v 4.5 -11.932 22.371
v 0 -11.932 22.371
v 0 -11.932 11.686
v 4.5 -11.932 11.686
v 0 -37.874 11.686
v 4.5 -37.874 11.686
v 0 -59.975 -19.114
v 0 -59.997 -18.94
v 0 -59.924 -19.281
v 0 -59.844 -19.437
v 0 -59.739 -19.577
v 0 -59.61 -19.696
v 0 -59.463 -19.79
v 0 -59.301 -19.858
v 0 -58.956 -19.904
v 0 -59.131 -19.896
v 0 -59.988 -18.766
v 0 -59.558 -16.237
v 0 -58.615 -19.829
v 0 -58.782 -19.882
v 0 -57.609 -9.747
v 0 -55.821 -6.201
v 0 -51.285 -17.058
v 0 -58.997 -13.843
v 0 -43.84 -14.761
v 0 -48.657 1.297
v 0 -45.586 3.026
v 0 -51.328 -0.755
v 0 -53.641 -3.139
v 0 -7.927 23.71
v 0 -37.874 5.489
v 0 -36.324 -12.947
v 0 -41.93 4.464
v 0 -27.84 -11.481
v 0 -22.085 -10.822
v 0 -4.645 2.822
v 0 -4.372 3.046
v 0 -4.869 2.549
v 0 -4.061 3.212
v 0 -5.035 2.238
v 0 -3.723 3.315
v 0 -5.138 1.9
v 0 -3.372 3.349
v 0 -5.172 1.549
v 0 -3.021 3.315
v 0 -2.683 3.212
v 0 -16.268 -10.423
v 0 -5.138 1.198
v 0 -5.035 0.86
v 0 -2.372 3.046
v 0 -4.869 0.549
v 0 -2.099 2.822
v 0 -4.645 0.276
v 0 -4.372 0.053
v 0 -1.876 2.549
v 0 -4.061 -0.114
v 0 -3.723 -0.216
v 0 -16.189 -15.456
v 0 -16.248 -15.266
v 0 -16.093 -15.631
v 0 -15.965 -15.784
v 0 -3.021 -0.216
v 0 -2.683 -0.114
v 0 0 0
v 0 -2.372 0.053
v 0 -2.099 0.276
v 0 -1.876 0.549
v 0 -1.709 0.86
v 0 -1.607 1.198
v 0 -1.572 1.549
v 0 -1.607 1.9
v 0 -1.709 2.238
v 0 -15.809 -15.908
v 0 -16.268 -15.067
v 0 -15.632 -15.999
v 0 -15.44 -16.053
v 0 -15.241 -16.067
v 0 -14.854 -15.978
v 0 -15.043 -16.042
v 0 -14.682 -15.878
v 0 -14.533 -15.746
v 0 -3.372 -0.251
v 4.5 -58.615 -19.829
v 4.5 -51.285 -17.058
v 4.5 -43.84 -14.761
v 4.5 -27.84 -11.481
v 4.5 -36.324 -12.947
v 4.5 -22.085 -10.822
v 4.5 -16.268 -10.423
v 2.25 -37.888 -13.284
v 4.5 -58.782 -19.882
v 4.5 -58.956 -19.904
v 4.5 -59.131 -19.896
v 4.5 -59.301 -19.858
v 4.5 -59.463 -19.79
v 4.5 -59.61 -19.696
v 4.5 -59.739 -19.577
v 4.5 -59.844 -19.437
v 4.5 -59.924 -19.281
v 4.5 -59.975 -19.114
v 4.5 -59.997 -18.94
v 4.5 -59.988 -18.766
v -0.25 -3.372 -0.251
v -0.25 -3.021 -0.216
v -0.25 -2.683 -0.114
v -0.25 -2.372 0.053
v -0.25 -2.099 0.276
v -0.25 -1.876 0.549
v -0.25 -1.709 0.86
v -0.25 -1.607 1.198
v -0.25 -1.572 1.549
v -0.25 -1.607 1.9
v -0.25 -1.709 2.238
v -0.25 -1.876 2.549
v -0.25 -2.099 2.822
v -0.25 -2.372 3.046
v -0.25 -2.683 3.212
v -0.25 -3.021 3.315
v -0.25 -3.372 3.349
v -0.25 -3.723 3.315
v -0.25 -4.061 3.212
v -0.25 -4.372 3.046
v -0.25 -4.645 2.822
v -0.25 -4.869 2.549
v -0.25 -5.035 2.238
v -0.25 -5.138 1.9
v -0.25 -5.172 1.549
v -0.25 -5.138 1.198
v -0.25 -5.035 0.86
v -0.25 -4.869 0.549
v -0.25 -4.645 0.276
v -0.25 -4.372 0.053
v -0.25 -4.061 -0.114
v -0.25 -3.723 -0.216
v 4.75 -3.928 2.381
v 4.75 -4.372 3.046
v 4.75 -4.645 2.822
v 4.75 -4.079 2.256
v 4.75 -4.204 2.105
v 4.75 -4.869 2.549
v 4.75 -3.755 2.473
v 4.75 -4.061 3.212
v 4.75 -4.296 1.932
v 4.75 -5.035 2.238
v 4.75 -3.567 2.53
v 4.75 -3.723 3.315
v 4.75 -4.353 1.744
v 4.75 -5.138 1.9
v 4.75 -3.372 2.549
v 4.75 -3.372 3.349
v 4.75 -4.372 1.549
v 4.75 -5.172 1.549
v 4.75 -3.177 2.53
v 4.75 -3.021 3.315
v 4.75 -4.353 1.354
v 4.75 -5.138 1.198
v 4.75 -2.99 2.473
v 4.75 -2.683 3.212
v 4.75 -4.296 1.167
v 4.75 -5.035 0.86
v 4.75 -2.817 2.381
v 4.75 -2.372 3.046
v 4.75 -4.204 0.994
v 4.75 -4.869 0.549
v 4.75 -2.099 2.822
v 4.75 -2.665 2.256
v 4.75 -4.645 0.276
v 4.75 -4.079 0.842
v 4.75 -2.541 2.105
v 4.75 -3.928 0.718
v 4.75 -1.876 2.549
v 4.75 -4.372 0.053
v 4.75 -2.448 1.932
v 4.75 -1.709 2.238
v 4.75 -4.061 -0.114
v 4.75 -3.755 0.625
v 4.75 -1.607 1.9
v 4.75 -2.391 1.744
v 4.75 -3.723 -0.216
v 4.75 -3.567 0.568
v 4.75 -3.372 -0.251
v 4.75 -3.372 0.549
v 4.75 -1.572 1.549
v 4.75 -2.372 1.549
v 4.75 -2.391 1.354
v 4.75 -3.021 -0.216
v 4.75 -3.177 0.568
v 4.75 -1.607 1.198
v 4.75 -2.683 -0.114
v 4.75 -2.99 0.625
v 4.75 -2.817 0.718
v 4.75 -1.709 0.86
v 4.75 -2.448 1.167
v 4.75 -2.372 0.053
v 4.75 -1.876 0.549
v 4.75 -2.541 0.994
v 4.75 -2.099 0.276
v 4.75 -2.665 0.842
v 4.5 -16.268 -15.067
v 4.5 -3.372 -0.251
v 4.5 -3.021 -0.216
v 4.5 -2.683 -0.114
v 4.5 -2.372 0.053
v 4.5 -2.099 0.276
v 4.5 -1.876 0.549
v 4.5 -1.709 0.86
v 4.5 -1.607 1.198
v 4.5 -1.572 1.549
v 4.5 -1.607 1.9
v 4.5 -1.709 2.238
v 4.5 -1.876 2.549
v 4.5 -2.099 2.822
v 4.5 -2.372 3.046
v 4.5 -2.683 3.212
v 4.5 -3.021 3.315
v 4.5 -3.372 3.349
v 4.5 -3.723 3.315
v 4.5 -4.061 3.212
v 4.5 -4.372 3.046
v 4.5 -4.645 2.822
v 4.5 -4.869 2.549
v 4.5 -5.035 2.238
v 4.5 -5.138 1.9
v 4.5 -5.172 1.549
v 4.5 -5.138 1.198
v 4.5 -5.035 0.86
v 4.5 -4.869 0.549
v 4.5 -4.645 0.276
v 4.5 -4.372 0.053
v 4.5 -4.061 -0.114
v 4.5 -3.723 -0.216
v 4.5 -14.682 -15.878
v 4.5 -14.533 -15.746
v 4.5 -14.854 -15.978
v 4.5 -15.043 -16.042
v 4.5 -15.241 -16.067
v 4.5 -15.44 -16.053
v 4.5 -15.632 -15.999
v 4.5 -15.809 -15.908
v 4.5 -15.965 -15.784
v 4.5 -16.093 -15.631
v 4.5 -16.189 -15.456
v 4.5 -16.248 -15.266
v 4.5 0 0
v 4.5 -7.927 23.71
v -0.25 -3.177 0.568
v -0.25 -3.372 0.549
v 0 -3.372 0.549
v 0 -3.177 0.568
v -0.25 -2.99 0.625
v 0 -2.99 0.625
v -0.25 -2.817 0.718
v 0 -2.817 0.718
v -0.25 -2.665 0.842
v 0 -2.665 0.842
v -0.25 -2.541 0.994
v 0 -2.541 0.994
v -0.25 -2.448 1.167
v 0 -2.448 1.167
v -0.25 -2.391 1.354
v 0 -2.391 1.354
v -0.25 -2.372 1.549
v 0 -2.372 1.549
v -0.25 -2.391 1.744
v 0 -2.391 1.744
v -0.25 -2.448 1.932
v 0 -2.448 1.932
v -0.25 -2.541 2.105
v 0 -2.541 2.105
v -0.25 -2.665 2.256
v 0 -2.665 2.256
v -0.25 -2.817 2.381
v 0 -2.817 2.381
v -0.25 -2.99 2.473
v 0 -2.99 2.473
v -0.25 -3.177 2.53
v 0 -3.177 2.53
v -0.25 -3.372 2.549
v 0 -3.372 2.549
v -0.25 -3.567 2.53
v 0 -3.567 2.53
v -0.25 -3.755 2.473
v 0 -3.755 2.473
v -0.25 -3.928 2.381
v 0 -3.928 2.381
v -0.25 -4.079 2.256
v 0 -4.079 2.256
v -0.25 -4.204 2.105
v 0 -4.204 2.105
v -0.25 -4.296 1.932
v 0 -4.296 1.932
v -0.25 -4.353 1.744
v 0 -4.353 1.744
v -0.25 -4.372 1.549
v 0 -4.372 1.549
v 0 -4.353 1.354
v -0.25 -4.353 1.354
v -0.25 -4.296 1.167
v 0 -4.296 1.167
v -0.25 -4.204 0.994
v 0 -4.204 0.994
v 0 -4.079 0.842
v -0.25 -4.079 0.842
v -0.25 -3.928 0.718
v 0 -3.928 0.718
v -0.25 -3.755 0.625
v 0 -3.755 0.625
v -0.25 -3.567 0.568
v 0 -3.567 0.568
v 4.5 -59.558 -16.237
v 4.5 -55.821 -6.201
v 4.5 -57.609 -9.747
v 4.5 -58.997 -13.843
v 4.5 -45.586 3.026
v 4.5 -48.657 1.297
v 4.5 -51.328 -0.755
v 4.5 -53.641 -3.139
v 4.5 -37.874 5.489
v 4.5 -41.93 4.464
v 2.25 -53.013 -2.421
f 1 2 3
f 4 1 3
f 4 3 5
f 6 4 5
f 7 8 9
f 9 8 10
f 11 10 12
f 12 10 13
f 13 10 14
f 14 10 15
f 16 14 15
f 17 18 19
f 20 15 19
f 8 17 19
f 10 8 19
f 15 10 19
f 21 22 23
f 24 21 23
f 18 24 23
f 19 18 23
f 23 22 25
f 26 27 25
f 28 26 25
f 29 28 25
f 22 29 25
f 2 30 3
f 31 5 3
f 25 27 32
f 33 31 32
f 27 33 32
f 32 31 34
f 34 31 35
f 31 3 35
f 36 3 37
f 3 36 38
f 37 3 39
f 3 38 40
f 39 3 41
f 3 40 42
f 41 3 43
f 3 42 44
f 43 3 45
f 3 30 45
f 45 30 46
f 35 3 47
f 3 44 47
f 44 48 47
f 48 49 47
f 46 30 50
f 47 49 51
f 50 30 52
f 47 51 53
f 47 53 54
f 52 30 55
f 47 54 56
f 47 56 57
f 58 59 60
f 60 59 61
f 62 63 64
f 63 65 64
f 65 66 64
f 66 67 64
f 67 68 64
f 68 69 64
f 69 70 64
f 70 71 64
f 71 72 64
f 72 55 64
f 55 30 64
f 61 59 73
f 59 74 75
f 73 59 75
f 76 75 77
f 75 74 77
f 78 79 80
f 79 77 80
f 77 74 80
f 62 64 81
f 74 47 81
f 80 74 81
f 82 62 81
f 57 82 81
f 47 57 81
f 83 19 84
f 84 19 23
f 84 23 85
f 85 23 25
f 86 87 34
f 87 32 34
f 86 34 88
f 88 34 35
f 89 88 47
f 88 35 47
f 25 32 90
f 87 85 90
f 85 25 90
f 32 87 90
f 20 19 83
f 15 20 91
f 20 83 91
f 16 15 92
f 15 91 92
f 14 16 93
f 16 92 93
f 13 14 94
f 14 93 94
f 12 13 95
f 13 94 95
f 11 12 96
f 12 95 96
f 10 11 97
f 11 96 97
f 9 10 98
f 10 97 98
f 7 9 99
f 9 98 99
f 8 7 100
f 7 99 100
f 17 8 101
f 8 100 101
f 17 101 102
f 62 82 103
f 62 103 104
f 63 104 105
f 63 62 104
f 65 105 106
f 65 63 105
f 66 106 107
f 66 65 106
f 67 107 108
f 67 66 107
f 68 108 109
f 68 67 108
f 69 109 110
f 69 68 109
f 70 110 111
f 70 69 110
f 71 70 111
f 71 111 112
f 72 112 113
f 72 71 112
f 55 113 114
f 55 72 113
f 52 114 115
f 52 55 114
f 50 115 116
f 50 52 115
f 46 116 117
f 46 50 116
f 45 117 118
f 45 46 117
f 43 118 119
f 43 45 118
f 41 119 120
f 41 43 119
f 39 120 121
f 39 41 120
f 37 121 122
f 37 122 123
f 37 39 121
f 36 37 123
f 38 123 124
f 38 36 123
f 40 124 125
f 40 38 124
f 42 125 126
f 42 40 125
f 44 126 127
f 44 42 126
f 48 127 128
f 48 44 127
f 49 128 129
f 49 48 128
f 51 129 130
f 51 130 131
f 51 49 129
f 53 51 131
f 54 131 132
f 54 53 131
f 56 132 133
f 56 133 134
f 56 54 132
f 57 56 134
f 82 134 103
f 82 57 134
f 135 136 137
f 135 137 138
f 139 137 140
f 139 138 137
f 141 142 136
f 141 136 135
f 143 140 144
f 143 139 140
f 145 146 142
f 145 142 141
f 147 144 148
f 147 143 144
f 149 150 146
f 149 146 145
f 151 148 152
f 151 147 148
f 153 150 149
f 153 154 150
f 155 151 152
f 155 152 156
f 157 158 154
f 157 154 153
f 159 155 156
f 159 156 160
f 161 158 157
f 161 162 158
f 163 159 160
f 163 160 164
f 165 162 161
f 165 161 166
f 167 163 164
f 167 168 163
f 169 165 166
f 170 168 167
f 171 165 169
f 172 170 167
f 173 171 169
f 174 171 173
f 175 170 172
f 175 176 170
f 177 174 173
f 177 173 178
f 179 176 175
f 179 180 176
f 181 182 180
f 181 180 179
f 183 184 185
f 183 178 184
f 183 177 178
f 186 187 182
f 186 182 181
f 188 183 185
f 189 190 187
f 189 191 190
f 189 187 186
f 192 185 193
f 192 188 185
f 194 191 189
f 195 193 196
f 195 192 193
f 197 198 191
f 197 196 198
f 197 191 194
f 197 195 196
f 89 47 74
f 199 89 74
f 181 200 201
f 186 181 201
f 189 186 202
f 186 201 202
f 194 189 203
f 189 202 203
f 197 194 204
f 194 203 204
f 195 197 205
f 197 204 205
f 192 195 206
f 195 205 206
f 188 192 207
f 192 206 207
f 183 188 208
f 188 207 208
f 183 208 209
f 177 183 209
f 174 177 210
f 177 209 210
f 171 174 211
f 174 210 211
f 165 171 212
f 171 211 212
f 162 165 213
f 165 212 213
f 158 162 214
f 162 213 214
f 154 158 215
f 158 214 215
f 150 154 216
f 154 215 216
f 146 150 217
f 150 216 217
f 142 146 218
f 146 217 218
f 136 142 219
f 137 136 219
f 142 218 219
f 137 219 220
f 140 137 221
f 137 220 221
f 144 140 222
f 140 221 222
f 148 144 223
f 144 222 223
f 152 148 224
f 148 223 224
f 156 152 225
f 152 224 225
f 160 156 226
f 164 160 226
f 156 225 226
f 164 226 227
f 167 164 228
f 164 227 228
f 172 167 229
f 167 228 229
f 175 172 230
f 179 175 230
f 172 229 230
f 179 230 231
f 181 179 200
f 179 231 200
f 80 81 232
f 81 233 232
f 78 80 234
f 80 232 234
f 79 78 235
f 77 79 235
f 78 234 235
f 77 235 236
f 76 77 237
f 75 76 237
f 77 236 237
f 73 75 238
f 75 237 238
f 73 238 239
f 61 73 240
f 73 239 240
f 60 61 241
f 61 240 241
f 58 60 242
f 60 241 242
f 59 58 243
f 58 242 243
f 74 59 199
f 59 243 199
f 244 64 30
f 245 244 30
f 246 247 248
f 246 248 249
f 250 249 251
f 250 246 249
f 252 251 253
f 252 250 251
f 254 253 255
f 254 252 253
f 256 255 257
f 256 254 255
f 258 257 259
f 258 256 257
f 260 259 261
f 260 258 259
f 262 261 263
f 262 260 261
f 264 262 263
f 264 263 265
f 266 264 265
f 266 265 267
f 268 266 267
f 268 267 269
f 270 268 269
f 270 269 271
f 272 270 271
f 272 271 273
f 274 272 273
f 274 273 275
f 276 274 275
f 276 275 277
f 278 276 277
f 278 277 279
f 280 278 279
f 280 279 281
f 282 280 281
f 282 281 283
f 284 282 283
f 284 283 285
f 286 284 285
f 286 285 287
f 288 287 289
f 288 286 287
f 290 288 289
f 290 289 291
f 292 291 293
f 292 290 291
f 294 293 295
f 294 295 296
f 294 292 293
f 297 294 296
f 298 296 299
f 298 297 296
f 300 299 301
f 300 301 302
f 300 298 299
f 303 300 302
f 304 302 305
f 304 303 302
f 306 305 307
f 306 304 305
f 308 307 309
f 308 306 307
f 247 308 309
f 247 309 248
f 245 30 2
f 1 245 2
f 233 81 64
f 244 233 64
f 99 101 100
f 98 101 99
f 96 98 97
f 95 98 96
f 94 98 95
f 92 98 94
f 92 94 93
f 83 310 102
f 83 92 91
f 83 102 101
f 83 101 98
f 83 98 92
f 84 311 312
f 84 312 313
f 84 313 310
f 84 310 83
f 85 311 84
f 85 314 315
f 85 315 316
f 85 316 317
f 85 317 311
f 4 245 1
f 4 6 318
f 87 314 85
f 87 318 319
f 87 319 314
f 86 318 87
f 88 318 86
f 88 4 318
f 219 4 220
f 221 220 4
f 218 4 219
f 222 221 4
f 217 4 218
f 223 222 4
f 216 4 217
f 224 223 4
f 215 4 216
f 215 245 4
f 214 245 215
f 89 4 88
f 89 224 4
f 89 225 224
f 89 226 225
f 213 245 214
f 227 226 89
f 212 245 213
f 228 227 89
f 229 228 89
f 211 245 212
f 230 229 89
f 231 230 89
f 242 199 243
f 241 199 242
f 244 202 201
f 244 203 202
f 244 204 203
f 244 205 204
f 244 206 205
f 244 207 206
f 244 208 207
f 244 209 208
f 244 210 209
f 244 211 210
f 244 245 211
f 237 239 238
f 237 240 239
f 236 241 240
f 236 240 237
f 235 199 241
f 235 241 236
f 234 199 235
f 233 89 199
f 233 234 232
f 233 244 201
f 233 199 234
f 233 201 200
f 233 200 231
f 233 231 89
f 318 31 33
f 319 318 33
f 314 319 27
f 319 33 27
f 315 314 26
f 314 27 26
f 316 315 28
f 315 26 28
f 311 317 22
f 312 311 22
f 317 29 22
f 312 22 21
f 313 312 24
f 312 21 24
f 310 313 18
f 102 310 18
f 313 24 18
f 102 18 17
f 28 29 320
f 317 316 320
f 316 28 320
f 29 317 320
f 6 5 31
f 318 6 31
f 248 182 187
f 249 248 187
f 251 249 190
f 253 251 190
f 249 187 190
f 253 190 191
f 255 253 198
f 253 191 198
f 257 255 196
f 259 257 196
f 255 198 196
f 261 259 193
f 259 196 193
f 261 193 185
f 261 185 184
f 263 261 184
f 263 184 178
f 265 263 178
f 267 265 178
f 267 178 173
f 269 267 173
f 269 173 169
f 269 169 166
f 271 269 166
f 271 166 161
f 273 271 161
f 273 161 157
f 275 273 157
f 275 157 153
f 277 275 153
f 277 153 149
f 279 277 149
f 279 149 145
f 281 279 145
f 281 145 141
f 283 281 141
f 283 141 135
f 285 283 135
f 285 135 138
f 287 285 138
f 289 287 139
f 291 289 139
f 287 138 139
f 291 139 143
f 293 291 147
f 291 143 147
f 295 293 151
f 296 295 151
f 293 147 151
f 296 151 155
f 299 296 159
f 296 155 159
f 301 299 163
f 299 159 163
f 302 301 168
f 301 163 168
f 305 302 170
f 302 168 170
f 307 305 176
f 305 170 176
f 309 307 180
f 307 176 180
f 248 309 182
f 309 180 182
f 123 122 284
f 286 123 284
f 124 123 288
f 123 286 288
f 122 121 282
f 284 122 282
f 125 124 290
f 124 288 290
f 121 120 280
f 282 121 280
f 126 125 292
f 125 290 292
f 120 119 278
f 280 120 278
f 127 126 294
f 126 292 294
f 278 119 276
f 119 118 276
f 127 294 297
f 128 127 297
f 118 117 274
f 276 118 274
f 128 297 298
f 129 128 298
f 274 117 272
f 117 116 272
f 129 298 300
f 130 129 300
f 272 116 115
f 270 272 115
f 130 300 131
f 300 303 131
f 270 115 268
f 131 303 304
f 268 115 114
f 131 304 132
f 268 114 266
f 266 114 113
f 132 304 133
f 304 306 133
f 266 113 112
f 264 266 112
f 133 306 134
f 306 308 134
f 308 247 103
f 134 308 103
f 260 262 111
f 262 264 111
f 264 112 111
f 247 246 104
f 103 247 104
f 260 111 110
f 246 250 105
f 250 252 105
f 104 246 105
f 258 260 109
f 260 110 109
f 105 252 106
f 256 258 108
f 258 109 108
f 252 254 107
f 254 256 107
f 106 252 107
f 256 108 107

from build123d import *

# Parameters (mm, degrees)
BOSS_EXTRUDE2_DEPTH     = 4.5
SKETCH4_R               = 1
CUT_EXTRUDE2_DEPTH      = 1.0000001
CUT_EXTRUDE2_DEPTH_BACK = 5.5000001
FILLET1_R               = 1
FILLET2_R               = 1
SKETCH5_R               = 1.8
BOSS_EXTRUDE3_DEPTH     = 0.25
SKETCH7_R               = 1
CUT_EXTRUDE3_DEPTH      = 5.7500001


with BuildPart() as part:
    # Sketch3 → Boss-Extrude2 (new body)
    with BuildSketch(Plane(origin=(0, 0, 0), x_dir=(0, 0, -1), z_dir=(1, 0, 0))):
        with BuildLine():
            Line((0, 0), (-23.709832228, -7.927411666))
            Line((-23.709832228, -7.927411666), (-22.370761505, -11.93239381))
            Line((-22.370761505, -11.93239381), (-11.685771853, -11.93239381))
            Line((-11.685771853, -11.93239381), (-11.685771853, -37.874021232))
            Line((-11.685771853, -37.874021232), (-5.488568376, -37.874021232))
            add(Edge.make_bspline(
                [(-5.488568376, -37.874021232), (-1.643222614, -57.890316076), (20.496609615, -60.199338536)],
                knots=[0, 0, 0, 1, 1, 1], degree=2))
            add(Edge.make_bspline(
                [(20.496609615, -60.199338536), (11.480964524, -39.196951523), (10.423170282, -16.267555055)],
                knots=[0, 0, 0, 1, 1, 1], degree=2))
            Line((10.423170282, -16.267555055), (17.625325674, -16.267555055))
            Line((17.625325674, -16.267555055), (0, 0))
        make_face()
    extrude(amount=BOSS_EXTRUDE2_DEPTH)

    # Sketch4 → Cut-Extrude2 (cut, two sides)
    with BuildSketch(Plane(origin=(4.5, 0, 0), x_dir=(0, 0, -1), z_dir=(1, 0, 0))) as cut_extrude2_sk:
        with Locations((-1.549252561, -3.372235527)):
            Circle(SKETCH4_R)
    extrude(amount=CUT_EXTRUDE2_DEPTH, mode=Mode.SUBTRACT)
    extrude(cut_extrude2_sk.sketch, amount=-CUT_EXTRUDE2_DEPTH_BACK, mode=Mode.SUBTRACT)

    # Fillet1
    fillet1_edges = [part.edges().sort_by_distance(p)[0] for p in [
        (2.25, -16.267555055, -17.625325674),
    ]]
    fillet(fillet1_edges, radius=FILLET1_R)

    # Fillet2
    fillet2_edges = [part.edges().sort_by_distance(p)[0] for p in [
        (2.25, -60.199338536, -20.496609615),
    ]]
    fillet(fillet2_edges, radius=FILLET2_R)

    # Sketch5 → Boss-Extrude3 (add)
    with BuildSketch(Plane(origin=(4.5, 0, 0), x_dir=(0, 0, -1), z_dir=(1, 0, 0))):
        with Locations((-1.549252561, -3.372235527)):
            Circle(SKETCH5_R)
    boss_extrude3 = extrude(amount=BOSS_EXTRUDE3_DEPTH)

    # Sketch7 → Cut-Extrude3 (cut, through all)
    with BuildSketch(Plane(origin=(4.75, 0, 0), x_dir=(0, 0, -1), z_dir=(1, 0, 0))):
        with Locations((-1.549252561, -3.372235527)):
            Circle(SKETCH7_R)
    cut_extrude3 = extrude(amount=-CUT_EXTRUDE3_DEPTH, mode=Mode.SUBTRACT)

    # Mirror1: Boss-Extrude3, Cut-Extrude3 across plane
    add(boss_extrude3.mirror(Plane(origin=(2.25, 0, 0), x_dir=(0, 0, 1), z_dir=(1, 0, 0))))
    add(cut_extrude3.mirror(Plane(origin=(2.25, 0, 0), x_dir=(0, 0, 1), z_dir=(1, 0, 0))), mode=Mode.SUBTRACT)


solid = part.part
